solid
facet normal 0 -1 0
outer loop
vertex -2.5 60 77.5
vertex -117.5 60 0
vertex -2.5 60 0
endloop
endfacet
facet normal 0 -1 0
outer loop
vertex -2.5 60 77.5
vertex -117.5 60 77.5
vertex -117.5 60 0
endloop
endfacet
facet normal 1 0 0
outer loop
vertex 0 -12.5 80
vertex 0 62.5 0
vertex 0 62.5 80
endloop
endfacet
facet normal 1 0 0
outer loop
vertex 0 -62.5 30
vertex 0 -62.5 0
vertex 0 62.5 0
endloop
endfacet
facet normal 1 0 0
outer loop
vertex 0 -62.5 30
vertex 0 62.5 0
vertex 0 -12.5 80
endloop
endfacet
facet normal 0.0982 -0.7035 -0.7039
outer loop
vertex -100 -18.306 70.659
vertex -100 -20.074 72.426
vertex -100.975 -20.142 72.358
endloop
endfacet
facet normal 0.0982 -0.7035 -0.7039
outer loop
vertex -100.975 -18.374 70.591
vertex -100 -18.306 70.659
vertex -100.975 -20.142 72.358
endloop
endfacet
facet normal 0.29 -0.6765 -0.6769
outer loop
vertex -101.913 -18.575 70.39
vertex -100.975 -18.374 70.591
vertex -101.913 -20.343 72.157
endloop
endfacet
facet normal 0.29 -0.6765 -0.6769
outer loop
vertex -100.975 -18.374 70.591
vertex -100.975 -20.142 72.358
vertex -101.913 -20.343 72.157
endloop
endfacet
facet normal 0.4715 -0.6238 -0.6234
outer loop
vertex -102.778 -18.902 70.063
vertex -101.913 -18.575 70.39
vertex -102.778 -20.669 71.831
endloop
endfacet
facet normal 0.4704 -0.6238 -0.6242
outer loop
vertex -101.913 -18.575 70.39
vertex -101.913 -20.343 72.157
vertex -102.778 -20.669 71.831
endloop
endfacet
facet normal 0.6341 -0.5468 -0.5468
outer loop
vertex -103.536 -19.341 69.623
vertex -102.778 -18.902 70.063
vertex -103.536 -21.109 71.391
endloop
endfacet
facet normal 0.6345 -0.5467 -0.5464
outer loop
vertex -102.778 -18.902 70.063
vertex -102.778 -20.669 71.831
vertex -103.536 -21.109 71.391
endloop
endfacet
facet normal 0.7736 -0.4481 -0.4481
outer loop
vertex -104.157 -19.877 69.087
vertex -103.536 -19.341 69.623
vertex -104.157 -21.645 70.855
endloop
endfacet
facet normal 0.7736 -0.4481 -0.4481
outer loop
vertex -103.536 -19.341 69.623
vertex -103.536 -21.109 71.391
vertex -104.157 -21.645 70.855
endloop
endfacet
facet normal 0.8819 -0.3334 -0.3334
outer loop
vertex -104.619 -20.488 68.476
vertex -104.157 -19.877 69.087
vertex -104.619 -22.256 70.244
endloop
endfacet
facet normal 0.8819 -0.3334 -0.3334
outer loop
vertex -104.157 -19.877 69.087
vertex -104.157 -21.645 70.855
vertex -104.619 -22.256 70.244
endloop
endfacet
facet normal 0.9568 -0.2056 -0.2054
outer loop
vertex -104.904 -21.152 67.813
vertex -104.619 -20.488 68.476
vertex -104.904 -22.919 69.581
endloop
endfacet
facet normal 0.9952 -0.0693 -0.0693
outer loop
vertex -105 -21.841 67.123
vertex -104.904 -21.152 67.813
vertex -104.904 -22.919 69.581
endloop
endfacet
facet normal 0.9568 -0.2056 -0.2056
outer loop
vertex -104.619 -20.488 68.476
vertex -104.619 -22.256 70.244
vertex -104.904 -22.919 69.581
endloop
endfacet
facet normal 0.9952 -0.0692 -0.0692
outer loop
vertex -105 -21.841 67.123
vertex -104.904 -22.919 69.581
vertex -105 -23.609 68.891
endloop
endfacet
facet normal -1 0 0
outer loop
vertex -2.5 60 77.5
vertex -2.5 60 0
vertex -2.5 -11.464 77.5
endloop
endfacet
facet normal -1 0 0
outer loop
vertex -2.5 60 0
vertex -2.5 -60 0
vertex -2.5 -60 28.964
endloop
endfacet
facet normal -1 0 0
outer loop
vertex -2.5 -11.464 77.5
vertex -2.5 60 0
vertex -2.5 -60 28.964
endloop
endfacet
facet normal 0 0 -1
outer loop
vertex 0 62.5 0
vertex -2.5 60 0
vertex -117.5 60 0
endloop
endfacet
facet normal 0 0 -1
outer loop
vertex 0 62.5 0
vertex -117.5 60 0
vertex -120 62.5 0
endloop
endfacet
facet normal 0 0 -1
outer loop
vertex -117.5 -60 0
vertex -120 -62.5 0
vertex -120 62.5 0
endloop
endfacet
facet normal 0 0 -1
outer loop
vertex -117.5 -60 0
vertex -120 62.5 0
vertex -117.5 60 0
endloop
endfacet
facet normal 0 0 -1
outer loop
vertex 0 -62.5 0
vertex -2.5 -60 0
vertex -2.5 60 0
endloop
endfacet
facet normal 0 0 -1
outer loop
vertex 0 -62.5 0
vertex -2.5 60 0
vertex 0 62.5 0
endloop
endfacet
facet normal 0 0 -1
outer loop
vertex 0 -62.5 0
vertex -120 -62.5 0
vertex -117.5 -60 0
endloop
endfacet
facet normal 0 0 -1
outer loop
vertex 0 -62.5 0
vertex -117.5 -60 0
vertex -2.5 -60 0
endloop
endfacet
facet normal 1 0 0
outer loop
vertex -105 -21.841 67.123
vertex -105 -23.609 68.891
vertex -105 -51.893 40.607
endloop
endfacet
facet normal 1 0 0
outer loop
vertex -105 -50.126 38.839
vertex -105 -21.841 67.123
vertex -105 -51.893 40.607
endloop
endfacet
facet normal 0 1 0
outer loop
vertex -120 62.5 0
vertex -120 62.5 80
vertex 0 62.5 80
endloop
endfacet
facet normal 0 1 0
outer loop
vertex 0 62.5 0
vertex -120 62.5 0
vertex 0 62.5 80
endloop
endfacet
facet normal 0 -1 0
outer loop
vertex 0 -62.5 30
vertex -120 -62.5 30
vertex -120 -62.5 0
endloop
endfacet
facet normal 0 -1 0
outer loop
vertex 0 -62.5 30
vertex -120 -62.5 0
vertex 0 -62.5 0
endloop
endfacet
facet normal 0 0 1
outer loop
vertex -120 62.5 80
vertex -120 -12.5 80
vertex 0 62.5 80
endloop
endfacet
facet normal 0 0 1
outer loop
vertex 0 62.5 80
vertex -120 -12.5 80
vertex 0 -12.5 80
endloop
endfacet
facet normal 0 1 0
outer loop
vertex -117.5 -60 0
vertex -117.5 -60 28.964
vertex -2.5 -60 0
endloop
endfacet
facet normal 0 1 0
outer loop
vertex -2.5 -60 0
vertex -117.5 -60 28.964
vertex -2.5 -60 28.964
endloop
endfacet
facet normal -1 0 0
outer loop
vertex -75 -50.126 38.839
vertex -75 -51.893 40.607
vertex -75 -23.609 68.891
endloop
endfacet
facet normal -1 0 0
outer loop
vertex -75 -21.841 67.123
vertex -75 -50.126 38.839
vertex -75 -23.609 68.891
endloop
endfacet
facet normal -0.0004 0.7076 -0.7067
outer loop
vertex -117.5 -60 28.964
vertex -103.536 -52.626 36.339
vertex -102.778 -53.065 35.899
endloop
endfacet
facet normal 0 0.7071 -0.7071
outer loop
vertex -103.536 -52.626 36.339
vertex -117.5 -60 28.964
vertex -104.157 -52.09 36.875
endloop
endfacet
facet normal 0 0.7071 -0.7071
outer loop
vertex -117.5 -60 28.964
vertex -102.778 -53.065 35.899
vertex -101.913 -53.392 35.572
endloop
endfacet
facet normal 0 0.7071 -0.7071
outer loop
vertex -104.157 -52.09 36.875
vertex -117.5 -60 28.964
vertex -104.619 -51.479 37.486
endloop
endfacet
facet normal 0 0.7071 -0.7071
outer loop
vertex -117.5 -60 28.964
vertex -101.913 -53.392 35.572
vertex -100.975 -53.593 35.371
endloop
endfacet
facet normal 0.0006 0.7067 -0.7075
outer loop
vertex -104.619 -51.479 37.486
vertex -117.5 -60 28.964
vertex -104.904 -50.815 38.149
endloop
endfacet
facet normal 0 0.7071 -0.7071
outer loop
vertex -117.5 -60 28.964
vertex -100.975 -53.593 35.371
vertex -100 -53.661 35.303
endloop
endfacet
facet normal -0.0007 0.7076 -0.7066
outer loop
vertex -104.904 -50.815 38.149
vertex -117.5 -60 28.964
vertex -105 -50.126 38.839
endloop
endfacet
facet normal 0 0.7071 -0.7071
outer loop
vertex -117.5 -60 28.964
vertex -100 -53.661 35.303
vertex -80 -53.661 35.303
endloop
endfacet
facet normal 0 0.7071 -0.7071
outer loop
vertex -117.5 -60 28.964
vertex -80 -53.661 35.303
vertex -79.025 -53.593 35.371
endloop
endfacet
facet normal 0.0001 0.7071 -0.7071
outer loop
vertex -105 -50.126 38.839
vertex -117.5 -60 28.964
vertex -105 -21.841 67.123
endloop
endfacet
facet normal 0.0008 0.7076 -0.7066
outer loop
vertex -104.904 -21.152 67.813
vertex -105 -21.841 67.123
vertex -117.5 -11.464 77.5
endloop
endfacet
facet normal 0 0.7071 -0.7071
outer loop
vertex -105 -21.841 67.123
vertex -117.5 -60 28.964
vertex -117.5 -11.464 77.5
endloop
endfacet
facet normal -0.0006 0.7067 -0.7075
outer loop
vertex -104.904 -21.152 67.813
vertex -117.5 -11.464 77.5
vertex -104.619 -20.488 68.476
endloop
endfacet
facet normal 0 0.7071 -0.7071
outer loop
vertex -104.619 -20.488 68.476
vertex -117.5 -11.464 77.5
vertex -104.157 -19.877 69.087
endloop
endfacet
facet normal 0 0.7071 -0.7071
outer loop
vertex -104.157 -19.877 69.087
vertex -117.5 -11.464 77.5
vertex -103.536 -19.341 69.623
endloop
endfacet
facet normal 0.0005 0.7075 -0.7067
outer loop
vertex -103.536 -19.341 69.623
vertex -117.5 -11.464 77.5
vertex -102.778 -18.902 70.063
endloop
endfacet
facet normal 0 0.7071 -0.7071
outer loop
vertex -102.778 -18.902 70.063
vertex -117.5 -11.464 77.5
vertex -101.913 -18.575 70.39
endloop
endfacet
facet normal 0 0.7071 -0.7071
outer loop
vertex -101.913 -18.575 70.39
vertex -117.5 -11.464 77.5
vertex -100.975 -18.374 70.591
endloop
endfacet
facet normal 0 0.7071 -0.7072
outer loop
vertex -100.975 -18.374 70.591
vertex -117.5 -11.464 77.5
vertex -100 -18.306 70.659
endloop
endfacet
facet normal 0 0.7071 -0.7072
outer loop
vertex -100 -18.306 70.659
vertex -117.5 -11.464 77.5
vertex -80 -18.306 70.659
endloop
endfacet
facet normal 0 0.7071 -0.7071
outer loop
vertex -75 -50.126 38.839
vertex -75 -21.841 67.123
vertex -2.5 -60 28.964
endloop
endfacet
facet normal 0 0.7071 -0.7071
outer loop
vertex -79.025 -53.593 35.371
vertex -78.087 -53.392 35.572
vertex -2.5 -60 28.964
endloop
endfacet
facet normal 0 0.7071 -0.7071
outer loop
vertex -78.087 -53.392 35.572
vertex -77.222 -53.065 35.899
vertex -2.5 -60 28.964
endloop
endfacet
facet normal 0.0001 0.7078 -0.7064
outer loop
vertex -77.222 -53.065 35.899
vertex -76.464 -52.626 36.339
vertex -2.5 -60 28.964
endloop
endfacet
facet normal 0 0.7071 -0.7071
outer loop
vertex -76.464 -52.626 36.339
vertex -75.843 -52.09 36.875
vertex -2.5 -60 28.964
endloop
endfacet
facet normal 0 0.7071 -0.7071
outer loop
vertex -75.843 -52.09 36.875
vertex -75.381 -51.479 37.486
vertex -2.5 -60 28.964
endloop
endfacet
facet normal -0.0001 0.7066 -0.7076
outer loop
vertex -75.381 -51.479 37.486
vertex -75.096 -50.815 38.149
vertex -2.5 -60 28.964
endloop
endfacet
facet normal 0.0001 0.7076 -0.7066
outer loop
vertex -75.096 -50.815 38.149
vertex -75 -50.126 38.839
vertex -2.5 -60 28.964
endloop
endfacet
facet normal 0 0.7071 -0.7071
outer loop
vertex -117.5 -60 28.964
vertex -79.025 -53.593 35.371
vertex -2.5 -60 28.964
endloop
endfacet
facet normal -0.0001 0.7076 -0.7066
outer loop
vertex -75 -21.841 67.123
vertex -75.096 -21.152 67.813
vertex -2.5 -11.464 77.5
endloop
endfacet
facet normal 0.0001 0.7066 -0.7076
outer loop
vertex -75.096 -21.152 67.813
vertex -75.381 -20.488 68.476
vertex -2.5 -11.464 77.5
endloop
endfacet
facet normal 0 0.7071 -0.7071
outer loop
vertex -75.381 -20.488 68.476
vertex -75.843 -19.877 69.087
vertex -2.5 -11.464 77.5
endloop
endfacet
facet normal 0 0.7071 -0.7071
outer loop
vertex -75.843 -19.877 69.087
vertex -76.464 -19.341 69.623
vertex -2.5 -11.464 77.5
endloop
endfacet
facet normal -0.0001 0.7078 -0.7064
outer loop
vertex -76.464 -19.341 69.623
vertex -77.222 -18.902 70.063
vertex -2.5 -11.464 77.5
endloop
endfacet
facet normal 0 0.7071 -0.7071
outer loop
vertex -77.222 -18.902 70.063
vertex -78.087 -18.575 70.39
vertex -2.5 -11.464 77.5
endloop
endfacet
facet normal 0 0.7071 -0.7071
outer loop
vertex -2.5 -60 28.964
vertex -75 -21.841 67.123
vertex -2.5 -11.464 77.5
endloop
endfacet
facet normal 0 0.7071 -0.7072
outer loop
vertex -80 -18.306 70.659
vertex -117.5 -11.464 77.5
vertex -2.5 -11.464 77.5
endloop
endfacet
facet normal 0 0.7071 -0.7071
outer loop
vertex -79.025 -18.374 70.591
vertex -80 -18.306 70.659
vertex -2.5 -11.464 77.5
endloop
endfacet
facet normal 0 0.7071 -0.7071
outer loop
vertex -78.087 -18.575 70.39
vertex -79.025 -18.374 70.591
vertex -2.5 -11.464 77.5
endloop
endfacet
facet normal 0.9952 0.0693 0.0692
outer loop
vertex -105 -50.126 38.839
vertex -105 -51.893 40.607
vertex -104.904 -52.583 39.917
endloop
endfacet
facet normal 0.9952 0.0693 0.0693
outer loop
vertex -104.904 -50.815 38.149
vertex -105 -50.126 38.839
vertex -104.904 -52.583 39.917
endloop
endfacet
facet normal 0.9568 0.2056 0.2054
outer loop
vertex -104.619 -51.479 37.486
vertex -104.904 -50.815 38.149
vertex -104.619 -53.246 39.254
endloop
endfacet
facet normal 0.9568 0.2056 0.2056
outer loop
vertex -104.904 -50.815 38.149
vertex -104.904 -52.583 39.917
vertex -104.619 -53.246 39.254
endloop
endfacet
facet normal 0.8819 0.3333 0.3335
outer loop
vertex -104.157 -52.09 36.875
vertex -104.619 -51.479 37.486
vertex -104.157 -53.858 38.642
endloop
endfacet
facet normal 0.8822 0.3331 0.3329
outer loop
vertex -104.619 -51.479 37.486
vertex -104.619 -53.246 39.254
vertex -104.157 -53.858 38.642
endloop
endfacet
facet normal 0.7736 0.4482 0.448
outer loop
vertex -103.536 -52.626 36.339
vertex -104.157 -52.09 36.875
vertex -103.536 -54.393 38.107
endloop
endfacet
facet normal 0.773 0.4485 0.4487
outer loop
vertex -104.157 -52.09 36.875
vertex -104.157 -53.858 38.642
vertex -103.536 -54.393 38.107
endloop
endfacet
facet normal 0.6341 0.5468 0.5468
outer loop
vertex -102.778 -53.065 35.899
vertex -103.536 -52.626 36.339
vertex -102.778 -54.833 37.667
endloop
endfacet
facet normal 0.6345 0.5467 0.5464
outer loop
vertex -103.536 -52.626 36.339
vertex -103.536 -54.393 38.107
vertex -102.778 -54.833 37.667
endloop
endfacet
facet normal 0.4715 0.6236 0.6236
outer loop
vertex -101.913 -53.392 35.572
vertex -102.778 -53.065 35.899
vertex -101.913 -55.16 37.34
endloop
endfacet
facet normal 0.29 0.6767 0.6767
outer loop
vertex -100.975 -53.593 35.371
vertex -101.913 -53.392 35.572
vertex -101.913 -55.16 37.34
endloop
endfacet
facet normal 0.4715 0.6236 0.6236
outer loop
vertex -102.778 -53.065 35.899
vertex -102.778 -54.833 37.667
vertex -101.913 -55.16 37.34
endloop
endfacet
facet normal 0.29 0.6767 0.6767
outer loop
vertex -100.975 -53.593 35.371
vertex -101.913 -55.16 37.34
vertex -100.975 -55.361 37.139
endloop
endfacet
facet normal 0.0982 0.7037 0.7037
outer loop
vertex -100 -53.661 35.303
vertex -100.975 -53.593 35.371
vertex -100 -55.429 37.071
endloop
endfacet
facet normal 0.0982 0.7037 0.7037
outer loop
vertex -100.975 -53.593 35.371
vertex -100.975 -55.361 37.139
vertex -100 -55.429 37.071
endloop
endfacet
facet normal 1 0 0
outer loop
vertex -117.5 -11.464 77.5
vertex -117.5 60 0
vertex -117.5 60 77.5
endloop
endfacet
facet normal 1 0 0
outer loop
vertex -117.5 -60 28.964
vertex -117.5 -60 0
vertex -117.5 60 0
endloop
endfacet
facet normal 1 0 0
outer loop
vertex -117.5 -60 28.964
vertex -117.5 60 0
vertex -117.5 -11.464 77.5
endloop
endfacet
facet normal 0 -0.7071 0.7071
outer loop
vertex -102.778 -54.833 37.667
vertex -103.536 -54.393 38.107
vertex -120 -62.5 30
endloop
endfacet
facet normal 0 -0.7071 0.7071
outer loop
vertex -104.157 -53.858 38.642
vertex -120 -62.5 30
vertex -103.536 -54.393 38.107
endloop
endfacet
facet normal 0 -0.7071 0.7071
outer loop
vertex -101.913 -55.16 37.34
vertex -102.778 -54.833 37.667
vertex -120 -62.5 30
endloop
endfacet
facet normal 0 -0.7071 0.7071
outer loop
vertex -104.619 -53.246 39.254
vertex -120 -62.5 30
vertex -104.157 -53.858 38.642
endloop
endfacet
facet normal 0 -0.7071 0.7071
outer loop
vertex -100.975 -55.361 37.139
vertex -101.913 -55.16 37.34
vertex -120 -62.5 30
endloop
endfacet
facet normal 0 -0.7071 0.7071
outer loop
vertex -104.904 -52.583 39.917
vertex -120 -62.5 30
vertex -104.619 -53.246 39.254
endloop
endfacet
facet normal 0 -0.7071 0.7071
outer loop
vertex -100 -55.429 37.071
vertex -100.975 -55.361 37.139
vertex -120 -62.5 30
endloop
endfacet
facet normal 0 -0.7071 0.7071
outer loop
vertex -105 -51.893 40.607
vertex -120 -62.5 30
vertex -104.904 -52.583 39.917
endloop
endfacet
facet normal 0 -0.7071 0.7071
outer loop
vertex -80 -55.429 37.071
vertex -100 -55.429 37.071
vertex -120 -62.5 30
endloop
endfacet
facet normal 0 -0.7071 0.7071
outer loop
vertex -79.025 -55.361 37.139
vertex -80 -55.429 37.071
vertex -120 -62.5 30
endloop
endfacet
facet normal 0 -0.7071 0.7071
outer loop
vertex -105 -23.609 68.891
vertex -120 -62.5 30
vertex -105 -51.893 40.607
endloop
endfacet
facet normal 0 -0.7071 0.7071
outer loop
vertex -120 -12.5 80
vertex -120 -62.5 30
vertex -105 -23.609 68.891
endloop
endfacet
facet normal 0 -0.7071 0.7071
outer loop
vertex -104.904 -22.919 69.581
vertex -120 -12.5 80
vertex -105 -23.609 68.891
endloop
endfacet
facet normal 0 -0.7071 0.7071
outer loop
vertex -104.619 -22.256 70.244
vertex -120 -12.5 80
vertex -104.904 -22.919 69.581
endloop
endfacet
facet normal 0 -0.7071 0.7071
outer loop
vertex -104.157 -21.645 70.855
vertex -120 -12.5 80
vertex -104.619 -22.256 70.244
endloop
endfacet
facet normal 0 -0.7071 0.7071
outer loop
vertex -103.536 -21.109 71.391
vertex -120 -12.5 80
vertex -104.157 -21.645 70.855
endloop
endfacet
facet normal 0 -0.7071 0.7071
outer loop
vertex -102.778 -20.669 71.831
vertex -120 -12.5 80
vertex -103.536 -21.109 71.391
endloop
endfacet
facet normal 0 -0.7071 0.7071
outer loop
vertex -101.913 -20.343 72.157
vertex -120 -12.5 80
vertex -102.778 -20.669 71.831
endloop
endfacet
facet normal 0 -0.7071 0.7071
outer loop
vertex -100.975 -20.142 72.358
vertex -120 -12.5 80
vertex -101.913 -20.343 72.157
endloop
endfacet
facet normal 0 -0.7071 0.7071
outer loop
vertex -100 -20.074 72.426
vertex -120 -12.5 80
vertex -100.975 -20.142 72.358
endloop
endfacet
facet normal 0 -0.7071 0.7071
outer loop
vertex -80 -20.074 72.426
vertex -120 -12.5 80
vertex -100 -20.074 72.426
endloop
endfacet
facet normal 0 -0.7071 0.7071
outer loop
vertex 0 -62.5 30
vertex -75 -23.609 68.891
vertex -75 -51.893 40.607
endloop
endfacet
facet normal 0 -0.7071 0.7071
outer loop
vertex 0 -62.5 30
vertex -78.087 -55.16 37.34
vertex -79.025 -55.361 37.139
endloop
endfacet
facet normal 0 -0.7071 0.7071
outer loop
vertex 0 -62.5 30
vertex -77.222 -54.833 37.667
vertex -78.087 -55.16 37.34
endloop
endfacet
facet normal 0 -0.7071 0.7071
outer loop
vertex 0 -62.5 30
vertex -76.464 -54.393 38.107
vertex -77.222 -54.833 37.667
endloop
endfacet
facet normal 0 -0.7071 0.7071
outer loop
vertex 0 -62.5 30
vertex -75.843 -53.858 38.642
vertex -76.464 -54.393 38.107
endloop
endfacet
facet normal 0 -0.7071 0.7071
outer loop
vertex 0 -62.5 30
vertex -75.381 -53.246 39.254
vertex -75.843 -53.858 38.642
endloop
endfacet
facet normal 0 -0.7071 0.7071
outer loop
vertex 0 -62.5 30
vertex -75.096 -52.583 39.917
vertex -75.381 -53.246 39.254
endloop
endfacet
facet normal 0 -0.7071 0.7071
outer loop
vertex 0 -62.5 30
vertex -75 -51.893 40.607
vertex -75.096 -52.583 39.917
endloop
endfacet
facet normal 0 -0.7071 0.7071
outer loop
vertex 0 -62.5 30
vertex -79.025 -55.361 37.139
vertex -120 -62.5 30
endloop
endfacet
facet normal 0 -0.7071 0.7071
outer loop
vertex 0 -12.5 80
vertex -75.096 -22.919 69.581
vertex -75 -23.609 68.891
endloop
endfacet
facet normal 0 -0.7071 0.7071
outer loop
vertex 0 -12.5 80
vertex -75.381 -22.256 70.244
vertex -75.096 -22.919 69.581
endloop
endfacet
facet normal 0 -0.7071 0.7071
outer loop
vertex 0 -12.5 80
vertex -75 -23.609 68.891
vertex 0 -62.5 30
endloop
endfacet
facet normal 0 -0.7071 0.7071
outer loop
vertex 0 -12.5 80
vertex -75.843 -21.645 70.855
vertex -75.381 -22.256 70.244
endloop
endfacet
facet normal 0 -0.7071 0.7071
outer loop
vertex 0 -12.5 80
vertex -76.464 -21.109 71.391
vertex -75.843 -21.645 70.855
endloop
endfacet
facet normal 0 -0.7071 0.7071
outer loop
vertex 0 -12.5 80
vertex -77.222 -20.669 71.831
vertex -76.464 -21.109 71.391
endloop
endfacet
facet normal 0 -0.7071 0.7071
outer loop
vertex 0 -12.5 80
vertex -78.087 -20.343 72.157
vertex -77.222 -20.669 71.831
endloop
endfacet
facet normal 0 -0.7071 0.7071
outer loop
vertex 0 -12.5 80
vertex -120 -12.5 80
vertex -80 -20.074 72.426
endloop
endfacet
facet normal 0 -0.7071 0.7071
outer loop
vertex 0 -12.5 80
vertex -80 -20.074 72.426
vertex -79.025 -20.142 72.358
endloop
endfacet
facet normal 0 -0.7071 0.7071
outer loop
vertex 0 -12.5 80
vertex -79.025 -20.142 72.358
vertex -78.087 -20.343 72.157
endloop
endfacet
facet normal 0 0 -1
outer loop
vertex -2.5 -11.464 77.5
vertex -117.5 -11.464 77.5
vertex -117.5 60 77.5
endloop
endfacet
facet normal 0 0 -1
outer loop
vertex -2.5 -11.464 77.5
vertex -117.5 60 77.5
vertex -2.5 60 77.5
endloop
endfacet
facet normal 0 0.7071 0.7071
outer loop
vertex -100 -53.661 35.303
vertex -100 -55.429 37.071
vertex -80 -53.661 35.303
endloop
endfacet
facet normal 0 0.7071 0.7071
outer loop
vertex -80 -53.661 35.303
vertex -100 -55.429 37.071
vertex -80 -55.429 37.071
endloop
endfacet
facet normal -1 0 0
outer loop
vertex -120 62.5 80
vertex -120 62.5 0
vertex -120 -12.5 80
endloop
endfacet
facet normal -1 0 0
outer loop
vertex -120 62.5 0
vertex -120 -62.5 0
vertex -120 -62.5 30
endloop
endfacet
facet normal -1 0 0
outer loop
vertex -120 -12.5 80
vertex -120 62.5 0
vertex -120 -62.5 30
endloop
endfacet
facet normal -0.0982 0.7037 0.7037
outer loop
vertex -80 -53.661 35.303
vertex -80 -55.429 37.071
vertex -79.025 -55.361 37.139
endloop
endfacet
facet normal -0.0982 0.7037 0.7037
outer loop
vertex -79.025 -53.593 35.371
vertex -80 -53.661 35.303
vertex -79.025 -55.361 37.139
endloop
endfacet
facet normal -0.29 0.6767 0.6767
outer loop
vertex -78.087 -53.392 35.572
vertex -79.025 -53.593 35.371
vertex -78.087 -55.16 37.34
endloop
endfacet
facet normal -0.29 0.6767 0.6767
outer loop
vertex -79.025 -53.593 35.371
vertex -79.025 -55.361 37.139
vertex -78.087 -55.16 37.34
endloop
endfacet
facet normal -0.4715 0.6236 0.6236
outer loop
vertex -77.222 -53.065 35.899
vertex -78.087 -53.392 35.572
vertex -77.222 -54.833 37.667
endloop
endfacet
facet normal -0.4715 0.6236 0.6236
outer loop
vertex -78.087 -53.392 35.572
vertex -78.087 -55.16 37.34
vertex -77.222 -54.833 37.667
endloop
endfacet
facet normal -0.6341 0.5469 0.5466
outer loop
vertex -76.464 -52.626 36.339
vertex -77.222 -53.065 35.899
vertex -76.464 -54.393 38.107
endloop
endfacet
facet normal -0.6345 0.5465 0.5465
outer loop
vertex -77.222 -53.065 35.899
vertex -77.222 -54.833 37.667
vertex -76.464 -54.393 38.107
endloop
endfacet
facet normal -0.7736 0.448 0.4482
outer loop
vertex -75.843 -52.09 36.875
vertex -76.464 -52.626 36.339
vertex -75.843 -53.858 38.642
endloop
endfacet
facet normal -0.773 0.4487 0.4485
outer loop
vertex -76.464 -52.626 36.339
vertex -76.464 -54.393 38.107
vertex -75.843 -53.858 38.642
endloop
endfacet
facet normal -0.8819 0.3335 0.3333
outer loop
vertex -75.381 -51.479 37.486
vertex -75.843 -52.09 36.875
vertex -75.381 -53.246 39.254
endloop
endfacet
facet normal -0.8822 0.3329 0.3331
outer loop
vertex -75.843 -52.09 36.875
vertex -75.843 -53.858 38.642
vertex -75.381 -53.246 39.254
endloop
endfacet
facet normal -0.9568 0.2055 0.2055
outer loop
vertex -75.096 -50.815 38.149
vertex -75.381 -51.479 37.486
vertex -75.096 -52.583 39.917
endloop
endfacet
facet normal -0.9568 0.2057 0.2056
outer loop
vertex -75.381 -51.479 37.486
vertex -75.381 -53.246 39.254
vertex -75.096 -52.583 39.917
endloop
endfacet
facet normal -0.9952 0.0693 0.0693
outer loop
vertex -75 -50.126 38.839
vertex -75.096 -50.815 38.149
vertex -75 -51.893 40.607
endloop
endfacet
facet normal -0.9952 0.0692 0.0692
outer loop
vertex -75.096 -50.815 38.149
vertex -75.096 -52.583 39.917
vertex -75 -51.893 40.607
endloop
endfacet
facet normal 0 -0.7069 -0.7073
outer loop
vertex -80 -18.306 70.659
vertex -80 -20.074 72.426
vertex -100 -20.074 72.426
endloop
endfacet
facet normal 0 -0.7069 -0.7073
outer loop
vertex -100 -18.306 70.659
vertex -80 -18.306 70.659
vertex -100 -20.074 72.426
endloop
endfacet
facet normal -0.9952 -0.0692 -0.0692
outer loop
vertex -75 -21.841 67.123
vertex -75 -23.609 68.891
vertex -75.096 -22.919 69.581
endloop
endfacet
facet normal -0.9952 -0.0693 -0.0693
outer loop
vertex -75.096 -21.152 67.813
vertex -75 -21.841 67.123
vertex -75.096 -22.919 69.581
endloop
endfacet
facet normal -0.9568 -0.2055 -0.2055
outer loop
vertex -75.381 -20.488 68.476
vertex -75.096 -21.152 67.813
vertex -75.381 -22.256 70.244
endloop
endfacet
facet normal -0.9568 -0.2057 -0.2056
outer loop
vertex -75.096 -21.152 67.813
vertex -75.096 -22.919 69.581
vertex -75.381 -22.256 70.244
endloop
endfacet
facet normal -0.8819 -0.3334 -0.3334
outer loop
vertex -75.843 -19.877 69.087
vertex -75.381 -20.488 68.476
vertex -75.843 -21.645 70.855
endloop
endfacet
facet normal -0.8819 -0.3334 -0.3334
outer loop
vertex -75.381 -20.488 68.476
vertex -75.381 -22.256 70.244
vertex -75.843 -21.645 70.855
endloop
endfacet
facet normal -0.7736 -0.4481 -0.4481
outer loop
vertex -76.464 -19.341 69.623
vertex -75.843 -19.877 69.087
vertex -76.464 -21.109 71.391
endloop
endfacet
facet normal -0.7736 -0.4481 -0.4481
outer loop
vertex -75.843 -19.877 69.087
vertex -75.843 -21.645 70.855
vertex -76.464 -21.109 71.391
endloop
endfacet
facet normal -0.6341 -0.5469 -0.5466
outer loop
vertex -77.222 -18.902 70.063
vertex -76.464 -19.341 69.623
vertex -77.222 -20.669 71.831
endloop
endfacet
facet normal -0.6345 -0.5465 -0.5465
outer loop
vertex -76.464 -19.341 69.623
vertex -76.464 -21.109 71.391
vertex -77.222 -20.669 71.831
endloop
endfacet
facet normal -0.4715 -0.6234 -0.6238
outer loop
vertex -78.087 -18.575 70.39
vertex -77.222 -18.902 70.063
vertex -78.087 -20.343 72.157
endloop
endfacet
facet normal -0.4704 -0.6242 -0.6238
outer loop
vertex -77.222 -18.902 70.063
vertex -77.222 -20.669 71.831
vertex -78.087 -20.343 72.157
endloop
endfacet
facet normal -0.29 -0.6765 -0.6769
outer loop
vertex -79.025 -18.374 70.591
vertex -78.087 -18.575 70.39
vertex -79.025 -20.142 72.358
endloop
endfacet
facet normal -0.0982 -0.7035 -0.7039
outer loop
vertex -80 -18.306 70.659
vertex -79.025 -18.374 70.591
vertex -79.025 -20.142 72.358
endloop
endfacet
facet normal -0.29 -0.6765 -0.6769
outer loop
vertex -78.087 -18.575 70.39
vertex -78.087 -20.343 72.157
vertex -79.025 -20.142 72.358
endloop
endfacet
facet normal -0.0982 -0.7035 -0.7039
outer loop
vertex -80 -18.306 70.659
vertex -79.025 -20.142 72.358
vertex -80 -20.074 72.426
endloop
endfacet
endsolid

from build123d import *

# Parameters (mm, degrees)
F0_W     = 120
F0_H     = 80
F1_DEPTH = 62.5
F2_SIZE  = 50
F3_T     = -2.5
F5_DEPTH = 25


with BuildPart() as f1:
    # F0 (on Front) → F1 (new body, symmetric)
    with BuildSketch(Plane.XZ):
        with Locations((-60, 40)):
            Rectangle(F0_W, F0_H)
    extrude(amount=F1_DEPTH, both=True)

    # F2
    f2_edges = [f1.edges().sort_by_distance(p)[0] for p in [
        (-60, -62.5, 80),
    ]]
    chamfer(f2_edges, length=F2_SIZE)

    # F3
    f3_openings = [f1.faces().sort_by_distance(p)[0] for p in [
        (-60, 0, 0),
    ]]
    offset(amount=F3_T, openings=f3_openings)

    # F4 (on face) → F5 (cut)
    with BuildSketch(Plane(origin=(0, -46.25, 46.25), x_dir=(1, 0, 0), z_dir=(0, -0.707107, 0.707107))):
        with BuildLine():
            Line((-80, 37.01903), (-100, 37.01903))
            ThreePointArc((-100, 37.01903), (-103.535534, 35.554564), (-105, 32.01903))
            Line((-105, 32.01903), (-105, -7.98097))
            ThreePointArc((-105, -7.98097), (-103.535534, -11.516504), (-100, -12.98097))
            Line((-100, -12.98097), (-80, -12.98097))
            ThreePointArc((-80, -12.98097), (-76.464466, -11.516504), (-75, -7.98097))
            Line((-75, -7.98097), (-75, 32.01903))
            ThreePointArc((-75, 32.01903), (-76.464466, 35.554564), (-80, 37.01903))
        make_face()
    extrude(amount=-F5_DEPTH, mode=Mode.SUBTRACT)


solid = f1.part
